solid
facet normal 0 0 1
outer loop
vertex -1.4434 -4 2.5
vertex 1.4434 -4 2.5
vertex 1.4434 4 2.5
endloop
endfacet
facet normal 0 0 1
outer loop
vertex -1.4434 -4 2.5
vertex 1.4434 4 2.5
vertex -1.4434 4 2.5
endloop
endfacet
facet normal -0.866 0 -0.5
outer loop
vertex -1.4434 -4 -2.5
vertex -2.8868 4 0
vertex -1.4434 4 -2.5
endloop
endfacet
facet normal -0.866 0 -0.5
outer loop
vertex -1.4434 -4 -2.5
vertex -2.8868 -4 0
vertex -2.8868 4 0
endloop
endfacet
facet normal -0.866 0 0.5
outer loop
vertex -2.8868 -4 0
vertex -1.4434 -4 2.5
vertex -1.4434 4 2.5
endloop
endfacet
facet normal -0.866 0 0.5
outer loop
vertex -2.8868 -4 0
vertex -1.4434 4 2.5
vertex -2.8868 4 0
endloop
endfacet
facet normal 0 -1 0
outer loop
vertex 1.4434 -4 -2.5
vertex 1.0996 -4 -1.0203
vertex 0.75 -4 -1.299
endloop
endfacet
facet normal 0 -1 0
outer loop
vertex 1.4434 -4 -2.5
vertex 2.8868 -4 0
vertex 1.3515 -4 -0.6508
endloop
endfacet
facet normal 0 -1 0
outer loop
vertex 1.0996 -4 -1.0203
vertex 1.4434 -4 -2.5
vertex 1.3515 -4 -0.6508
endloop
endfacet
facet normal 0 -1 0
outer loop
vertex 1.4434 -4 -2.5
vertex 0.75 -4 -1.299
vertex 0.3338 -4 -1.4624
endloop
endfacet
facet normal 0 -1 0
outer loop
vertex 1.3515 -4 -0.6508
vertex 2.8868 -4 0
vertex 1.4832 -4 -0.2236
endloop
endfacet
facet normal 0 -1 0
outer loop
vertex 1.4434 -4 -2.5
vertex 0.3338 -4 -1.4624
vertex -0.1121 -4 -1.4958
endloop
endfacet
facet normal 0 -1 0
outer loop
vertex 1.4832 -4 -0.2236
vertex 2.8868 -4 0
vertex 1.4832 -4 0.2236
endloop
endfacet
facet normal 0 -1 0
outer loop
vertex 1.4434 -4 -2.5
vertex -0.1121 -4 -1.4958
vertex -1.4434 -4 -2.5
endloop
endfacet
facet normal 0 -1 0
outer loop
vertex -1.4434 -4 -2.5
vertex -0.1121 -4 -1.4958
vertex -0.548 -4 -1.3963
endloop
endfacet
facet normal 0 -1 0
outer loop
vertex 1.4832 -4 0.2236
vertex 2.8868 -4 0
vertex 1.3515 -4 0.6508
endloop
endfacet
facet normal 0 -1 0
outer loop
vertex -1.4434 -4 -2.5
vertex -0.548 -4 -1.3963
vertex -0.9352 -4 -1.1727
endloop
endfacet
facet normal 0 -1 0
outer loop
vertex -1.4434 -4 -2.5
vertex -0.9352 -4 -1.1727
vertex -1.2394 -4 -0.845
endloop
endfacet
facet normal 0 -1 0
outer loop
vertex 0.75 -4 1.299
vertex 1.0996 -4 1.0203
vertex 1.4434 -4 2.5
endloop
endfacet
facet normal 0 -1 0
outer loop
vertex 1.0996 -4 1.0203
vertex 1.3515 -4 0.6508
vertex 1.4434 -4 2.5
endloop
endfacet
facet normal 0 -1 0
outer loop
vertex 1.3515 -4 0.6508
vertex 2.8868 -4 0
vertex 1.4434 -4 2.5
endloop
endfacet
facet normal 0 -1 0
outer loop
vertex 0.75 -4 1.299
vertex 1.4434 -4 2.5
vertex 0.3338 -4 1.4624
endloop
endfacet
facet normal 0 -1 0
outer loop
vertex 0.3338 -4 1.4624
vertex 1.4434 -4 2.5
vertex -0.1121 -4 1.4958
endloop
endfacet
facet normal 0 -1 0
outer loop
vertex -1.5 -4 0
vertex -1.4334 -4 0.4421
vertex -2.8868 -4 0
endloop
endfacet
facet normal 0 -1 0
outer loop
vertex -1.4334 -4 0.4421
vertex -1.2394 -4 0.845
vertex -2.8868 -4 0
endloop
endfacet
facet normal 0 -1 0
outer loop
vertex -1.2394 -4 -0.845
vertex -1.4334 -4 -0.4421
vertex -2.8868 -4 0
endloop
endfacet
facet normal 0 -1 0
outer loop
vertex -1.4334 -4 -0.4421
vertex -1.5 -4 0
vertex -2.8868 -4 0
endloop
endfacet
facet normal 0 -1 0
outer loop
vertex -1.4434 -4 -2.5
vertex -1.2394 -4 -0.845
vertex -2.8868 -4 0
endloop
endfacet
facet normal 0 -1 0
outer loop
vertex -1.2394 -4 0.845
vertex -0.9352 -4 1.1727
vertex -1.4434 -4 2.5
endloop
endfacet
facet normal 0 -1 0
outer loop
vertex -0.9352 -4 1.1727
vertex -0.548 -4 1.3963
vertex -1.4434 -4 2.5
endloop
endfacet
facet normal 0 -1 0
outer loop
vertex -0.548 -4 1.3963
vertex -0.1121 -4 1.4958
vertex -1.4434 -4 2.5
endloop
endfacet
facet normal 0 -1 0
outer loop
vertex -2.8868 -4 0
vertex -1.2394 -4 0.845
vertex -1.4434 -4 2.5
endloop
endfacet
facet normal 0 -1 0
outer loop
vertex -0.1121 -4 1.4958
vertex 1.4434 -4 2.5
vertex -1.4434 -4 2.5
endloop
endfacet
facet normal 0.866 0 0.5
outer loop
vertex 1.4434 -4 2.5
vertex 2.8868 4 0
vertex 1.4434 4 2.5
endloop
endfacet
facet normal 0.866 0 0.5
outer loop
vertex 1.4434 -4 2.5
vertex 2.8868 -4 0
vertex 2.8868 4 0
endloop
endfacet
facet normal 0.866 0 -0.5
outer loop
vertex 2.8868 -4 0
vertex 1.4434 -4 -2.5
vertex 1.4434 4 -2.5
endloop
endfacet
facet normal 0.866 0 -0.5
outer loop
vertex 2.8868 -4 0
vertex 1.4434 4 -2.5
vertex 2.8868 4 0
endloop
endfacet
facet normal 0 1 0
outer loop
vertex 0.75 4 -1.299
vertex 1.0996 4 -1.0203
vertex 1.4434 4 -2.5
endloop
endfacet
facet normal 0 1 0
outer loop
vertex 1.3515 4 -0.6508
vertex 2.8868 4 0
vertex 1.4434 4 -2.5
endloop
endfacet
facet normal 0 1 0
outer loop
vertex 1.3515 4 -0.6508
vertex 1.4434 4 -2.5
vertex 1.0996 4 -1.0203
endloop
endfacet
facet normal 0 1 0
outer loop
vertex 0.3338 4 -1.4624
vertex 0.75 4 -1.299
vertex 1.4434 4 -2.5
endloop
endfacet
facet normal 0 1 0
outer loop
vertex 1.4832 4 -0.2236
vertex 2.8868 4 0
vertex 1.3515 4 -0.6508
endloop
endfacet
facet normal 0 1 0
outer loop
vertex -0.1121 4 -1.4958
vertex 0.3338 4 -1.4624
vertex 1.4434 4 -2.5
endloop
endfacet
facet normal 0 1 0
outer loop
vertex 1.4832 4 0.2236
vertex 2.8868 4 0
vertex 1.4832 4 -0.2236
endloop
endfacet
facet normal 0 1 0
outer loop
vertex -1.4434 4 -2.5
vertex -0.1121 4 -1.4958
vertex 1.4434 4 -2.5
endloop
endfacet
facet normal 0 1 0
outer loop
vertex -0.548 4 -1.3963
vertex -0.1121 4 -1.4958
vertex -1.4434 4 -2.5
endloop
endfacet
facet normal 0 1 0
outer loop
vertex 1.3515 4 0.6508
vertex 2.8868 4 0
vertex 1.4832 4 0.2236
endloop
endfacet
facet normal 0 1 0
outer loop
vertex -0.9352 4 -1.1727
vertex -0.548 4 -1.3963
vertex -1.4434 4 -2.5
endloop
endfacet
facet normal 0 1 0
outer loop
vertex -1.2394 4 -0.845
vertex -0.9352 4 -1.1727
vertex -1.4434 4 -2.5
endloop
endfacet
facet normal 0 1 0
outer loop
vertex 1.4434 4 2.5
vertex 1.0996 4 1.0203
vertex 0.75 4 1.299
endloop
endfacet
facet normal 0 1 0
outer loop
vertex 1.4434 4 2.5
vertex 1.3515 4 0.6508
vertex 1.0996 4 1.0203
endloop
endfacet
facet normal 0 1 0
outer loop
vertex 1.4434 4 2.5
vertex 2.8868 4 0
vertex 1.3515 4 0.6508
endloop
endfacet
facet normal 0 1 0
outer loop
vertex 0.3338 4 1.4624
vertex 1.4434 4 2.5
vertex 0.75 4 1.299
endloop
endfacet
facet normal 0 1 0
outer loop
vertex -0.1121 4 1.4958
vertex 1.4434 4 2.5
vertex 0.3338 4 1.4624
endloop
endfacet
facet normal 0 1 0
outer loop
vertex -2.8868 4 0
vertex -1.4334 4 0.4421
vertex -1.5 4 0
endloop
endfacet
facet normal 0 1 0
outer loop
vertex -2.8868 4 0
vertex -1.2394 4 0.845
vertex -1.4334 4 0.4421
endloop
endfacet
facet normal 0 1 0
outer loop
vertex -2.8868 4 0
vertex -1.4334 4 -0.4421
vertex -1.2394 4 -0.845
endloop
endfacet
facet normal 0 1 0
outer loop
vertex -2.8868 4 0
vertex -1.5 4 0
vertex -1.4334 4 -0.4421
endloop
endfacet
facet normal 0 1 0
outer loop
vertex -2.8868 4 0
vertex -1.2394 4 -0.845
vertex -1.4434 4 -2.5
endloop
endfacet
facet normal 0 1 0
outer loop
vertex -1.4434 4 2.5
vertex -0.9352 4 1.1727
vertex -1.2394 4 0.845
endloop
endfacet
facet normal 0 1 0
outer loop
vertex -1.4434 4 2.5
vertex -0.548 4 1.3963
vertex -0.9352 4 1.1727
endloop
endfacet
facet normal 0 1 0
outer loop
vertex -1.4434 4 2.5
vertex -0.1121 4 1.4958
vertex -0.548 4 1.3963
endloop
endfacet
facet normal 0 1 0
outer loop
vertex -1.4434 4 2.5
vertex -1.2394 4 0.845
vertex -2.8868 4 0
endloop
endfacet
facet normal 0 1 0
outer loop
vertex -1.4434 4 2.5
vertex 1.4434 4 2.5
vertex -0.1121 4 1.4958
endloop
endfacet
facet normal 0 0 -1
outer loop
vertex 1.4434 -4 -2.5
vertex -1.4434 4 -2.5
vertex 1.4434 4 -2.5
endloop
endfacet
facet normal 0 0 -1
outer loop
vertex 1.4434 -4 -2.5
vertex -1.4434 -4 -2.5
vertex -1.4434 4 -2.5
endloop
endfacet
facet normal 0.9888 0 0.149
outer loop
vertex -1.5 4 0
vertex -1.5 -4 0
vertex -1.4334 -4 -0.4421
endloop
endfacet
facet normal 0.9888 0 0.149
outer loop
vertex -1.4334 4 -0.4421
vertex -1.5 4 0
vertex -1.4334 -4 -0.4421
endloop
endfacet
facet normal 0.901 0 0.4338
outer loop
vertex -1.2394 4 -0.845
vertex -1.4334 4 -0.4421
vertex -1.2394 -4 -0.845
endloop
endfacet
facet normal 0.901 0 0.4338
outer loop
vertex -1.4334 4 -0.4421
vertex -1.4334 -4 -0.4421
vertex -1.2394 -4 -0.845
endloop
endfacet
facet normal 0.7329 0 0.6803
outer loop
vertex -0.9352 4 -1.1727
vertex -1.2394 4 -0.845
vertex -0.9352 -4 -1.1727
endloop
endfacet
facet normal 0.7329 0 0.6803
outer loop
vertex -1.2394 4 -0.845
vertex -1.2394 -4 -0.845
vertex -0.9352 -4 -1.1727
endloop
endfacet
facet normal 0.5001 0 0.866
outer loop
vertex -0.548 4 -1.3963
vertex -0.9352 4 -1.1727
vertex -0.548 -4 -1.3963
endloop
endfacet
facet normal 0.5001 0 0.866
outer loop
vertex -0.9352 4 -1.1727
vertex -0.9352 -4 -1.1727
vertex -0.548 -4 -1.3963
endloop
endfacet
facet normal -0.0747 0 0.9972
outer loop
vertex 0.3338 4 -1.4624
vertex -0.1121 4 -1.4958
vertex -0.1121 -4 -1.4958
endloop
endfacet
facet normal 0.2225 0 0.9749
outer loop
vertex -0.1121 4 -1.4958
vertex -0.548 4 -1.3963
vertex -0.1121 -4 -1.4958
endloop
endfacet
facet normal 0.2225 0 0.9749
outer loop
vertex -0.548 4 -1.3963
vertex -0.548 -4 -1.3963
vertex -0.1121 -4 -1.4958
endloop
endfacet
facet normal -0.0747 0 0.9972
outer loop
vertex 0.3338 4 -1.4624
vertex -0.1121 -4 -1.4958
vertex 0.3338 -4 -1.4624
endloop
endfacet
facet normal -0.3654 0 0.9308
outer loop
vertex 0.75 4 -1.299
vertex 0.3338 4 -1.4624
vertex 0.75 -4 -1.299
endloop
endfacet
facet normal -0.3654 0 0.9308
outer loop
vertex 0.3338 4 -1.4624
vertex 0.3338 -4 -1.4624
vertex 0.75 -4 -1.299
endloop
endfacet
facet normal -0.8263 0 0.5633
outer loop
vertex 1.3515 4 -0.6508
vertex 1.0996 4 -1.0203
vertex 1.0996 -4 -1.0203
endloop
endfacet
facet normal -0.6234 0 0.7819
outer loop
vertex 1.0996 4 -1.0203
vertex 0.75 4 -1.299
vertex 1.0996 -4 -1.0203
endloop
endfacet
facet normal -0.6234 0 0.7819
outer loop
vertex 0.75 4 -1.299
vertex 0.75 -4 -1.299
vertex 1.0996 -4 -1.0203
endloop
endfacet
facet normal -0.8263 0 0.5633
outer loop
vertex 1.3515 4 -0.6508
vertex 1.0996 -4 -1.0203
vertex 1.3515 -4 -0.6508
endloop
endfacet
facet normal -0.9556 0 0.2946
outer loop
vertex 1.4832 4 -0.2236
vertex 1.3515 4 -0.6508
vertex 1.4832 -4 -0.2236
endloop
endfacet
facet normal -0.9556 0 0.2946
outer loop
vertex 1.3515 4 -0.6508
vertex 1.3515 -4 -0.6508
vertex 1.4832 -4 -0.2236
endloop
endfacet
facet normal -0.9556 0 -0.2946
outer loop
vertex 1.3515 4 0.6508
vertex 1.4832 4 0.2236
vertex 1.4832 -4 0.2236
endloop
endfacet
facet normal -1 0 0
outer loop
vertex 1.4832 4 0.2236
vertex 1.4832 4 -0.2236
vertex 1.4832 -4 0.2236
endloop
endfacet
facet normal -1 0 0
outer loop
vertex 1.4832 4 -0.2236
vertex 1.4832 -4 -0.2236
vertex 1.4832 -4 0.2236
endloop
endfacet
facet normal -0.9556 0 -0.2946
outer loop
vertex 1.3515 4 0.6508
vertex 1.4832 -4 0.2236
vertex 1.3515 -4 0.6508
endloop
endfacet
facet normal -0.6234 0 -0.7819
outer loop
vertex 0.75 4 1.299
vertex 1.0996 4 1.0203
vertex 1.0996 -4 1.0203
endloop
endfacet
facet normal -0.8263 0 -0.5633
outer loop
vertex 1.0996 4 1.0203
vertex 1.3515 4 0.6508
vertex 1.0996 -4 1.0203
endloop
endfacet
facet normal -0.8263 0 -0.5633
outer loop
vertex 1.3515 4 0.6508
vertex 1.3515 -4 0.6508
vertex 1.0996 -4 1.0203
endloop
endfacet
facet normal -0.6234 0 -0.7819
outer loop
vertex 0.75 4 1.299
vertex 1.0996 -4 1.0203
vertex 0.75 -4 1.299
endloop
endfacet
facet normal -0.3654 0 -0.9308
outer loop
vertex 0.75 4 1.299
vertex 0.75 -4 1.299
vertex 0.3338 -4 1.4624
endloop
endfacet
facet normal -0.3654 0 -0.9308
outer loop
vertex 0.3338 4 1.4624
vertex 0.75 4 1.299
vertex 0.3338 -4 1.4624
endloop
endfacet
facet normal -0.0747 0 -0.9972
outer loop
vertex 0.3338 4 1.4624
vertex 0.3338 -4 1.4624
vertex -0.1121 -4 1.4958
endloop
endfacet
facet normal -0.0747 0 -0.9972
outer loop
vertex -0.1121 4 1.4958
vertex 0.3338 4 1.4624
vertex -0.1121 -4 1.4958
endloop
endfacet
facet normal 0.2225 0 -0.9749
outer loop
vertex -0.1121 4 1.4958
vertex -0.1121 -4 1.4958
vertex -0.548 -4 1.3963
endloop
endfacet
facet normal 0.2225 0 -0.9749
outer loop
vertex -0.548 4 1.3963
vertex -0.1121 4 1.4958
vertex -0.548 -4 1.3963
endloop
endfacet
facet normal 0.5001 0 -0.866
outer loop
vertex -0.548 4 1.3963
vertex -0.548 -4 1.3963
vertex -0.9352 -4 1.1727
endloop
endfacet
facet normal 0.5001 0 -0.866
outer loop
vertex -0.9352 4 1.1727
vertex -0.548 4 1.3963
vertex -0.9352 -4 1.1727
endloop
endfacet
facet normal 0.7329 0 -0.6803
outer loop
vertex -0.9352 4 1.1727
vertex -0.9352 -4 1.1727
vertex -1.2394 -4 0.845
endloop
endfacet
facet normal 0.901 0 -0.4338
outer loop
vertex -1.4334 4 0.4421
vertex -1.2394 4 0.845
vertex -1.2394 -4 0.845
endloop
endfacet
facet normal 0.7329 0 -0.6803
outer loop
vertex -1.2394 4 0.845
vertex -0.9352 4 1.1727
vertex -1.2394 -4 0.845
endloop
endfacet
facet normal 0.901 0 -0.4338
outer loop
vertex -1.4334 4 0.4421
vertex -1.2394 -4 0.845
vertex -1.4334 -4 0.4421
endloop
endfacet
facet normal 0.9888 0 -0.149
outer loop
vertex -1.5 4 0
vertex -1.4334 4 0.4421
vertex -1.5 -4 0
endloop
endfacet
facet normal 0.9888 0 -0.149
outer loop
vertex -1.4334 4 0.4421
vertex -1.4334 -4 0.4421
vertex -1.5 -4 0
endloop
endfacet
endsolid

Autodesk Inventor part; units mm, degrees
sketch "Эскиз1" plane through (0, 0, 0) normal (0, 1, 0) x (-1, 0, 0)
  line L0 (-2.8868, 0) -> (-1.4434, 2.5)
  line L1 (-1.4434, 2.5) -> (1.4434, 2.5)
  line L2 (1.4434, 2.5) -> (2.8868, 0)
  line L3 (2.8868, 0) -> (1.4434, -2.5)
  line L4 (1.4434, -2.5) -> (-1.4434, -2.5)
  line L5 (-1.4434, -2.5) -> (-2.8868, 0)
  circle A0 centre (0, 0) radius 1.5
  dimension "d0" = 5
  dimension "d2" = 3
extrude "Выдавливание1" add sketch "Эскиз1" along normal mid plane 8
properties part number "Стойка"
